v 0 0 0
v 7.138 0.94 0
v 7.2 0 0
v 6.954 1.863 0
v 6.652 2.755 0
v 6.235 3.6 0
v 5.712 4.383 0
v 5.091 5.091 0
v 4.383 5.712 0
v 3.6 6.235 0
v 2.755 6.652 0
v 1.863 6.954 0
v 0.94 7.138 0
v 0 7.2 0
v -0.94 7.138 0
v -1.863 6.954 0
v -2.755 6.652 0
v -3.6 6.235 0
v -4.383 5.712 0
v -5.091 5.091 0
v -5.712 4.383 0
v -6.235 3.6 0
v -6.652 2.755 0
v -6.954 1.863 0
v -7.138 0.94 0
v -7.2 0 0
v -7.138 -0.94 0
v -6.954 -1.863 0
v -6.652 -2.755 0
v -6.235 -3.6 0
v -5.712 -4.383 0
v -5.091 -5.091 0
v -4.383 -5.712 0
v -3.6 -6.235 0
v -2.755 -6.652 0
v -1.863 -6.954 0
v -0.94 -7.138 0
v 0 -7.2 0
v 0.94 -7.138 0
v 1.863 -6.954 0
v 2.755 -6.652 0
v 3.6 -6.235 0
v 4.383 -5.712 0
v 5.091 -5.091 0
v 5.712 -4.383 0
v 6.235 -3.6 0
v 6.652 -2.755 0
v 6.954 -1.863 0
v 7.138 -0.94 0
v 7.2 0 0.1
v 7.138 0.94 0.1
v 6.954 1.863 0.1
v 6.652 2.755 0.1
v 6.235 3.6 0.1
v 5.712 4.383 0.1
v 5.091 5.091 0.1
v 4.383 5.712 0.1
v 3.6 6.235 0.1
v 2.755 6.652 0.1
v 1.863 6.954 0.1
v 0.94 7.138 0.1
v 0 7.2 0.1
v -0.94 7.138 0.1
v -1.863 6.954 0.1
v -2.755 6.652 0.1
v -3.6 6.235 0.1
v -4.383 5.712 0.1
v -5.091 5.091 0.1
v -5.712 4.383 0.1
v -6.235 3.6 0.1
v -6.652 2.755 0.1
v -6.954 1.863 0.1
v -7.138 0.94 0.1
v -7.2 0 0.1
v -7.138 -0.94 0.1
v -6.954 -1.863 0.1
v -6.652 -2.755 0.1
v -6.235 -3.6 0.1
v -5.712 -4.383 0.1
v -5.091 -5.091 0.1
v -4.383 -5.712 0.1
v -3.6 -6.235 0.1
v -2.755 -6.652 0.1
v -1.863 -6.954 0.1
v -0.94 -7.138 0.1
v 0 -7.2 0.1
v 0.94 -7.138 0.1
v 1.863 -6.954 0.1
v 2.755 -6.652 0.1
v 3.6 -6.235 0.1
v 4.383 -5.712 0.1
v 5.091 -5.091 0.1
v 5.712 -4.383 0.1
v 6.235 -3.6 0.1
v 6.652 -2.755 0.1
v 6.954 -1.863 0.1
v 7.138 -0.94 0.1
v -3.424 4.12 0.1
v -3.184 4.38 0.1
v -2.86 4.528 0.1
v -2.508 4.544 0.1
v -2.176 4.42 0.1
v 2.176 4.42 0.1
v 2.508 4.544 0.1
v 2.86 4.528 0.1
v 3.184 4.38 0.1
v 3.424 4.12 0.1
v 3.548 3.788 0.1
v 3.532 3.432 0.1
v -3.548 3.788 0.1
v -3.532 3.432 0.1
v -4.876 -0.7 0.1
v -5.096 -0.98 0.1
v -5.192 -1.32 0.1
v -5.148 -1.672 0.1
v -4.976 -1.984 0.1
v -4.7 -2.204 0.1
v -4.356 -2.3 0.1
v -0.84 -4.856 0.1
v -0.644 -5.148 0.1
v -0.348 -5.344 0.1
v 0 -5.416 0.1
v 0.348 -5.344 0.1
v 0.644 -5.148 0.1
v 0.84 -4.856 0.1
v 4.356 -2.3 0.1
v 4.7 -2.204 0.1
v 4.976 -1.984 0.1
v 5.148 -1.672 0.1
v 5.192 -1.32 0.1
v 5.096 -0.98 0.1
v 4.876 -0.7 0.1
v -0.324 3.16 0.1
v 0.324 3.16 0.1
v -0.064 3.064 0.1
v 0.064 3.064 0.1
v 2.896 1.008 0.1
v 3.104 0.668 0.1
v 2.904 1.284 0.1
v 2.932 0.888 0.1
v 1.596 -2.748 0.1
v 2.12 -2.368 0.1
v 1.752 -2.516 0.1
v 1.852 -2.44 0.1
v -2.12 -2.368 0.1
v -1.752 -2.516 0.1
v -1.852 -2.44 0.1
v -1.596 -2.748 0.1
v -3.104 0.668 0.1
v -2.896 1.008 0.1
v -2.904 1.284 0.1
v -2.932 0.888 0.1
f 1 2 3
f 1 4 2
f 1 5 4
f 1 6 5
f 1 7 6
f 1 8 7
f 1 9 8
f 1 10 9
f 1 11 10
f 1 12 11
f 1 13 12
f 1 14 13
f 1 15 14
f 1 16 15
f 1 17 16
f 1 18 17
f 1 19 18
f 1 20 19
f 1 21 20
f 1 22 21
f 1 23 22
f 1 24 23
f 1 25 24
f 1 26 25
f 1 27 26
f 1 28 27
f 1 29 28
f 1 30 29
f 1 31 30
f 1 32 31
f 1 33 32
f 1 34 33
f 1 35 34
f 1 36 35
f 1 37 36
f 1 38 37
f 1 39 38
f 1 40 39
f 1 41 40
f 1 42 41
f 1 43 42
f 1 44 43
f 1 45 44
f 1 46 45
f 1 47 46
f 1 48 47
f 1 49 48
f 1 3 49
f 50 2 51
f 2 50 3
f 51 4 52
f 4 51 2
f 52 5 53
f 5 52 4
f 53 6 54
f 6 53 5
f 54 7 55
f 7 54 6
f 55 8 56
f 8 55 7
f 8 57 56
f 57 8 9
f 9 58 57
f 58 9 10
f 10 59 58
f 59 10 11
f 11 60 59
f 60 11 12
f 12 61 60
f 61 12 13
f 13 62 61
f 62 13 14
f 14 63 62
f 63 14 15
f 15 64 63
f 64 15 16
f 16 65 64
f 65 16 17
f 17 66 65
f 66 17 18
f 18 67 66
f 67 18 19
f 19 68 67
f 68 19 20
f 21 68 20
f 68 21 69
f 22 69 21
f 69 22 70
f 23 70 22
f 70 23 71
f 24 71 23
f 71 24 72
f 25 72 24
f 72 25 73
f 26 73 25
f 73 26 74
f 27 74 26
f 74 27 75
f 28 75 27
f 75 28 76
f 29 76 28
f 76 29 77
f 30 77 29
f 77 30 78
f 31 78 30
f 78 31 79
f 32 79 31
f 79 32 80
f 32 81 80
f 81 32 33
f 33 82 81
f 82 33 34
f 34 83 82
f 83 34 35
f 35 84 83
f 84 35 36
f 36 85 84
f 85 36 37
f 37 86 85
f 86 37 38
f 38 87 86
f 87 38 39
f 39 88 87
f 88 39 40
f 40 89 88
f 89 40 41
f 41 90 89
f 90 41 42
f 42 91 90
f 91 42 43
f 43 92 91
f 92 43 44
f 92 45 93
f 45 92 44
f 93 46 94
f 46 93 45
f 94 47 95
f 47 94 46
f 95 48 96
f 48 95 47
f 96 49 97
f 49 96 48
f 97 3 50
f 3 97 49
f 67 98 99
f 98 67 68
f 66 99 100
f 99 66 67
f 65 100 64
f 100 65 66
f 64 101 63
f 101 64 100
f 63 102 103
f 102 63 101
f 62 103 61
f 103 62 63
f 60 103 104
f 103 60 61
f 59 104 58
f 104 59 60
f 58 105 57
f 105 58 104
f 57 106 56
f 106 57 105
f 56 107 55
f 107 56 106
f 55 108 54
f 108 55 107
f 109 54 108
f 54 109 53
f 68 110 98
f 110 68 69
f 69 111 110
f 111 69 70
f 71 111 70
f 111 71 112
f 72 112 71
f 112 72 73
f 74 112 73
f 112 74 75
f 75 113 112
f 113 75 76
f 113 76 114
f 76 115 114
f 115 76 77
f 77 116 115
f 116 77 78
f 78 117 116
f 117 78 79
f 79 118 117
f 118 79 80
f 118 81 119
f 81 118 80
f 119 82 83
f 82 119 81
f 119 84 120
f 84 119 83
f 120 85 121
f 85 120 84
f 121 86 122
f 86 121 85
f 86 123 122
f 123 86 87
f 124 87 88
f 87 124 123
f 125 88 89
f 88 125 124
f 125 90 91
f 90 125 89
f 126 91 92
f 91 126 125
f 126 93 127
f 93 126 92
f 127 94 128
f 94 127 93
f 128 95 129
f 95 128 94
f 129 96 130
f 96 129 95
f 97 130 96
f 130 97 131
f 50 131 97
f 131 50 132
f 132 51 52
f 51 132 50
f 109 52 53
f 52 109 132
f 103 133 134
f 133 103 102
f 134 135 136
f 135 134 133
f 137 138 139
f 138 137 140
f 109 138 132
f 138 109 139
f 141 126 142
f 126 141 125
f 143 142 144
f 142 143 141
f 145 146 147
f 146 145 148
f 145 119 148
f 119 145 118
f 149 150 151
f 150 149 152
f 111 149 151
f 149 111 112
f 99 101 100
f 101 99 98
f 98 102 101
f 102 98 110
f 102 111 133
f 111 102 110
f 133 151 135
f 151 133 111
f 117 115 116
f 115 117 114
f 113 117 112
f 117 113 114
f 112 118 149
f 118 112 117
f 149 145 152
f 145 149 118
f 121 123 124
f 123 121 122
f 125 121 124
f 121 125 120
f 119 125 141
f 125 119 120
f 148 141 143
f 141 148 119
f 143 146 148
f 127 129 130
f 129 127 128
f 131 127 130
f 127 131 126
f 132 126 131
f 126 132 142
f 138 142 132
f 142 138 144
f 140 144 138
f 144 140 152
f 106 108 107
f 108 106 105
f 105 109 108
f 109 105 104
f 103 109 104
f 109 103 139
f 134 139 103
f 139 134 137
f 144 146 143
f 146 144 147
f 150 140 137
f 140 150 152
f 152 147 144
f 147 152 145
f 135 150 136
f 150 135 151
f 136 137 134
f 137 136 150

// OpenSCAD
// file: ../p/48/1-4cyli.scad
use <../../lib.scad>
function ldraw_lib__48__1_4cyli() = [
// 0 Hi-Res Cylinder 0.25
// 0 Name: 48\1-4cyli.dat
// 0 Author: Manfred Moolhuysen
// 0 !LDRAW_ORG 48_Primitive UPDATE 2009-01
// 0 !LICENSE Licensed under CC BY 2.0 and CC BY 4.0 : see CAreadme.txt
// 
// 0 BFC CERTIFY CCW
  [0,"BFC","CERTIFY"],
  [0,"BFC","CCW"],
// 
// 0 !HISTORY 1999-07-05 [PTadmin] Official Update 1999-05
// 0 !HISTORY 2002-02-28 [hafhead] Added BFC statement
// 0 !HISTORY 2002-04-25 [PTadmin] Official Update 2002-02
// 0 !HISTORY 2007-06-24 [PTadmin] Header formatted for Contributor Agreement
// 0 !HISTORY 2008-07-01 [PTadmin] Official Update 2008-01
// 0 !HISTORY 2008-07-07 [guyvivan] Made BFC'ed CCW (2005-12-06)
// 0 !HISTORY 2009-05-02 [PTadmin] Official Update 2009-01
// 
// 
// 4 16 0.9914 0 0.1305 1 0 0 1 1 0 0.9914 1 0.1305
  [4,16,0.9914,0,0.1305,1,0,0,1,1,0,0.9914,1,0.1305],
// 4 16 0.9659 0 0.2588 0.9914 0 0.1305 0.9914 1 0.1305 0.9659 1 0.2588
  [4,16,0.9659,0,0.2588,0.9914,0,0.1305,0.9914,1,0.1305,0.9659,1,0.2588],
// 4 16 0.9239 0 0.3827 0.9659 0 0.2588 0.9659 1 0.2588 0.9239 1 0.3827
  [4,16,0.9239,0,0.3827,0.9659,0,0.2588,0.9659,1,0.2588,0.9239,1,0.3827],
// 4 16 0.866 0 0.5 0.9239 0 0.3827 0.9239 1 0.3827 0.866 1 0.5
  [4,16,0.866,0,0.5,0.9239,0,0.3827,0.9239,1,0.3827,0.866,1,0.5],
// 4 16 0.7934 0 0.6088 0.866 0 0.5 0.866 1 0.5 0.7934 1 0.6088
  [4,16,0.7934,0,0.6088,0.866,0,0.5,0.866,1,0.5,0.7934,1,0.6088],
// 4 16 0.7071 0 0.7071 0.7934 0 0.6088 0.7934 1 0.6088 0.7071 1 0.7071
  [4,16,0.7071,0,0.7071,0.7934,0,0.6088,0.7934,1,0.6088,0.7071,1,0.7071],
// 4 16 0.6088 0 0.7934 0.7071 0 0.7071 0.7071 1 0.7071 0.6088 1 0.7934
  [4,16,0.6088,0,0.7934,0.7071,0,0.7071,0.7071,1,0.7071,0.6088,1,0.7934],
// 4 16 0.5 0 0.866 0.6088 0 0.7934 0.6088 1 0.7934 0.5 1 0.866
  [4,16,0.5,0,0.866,0.6088,0,0.7934,0.6088,1,0.7934,0.5,1,0.866],
// 4 16 0.3827 0 0.9239 0.5 0 0.866 0.5 1 0.866 0.3827 1 0.9239
  [4,16,0.3827,0,0.9239,0.5,0,0.866,0.5,1,0.866,0.3827,1,0.9239],
// 4 16 0.2588 0 0.9659 0.3827 0 0.9239 0.3827 1 0.9239 0.2588 1 0.9659
  [4,16,0.2588,0,0.9659,0.3827,0,0.9239,0.3827,1,0.9239,0.2588,1,0.9659],
// 4 16 0.1305 0 0.9914 0.2588 0 0.9659 0.2588 1 0.9659 0.1305 1 0.9914
  [4,16,0.1305,0,0.9914,0.2588,0,0.9659,0.2588,1,0.9659,0.1305,1,0.9914],
// 4 16 0 0 1 0.1305 0 0.9914 0.1305 1 0.9914 0 1 1
  [4,16,0,0,1,0.1305,0,0.9914,0.1305,1,0.9914,0,1,1],
// 
// 0 conditional lines
// 5 24 1 1 0 1 0 0 1 1 -1 0.9914 1 0.1305
  [5,24,1,1,0,1,0,0,1,1,-1,0.9914,1,0.1305],
// 5 24 0.9914 1 0.1305 0.9914 0 0.1305 1 1 0 0.9659 1 0.2588
  [5,24,0.9914,1,0.1305,0.9914,0,0.1305,1,1,0,0.9659,1,0.2588],
// 5 24 0.9659 1 0.2588 0.9659 0 0.2588 0.9914 1 0.1305 0.9239 1 0.3827
  [5,24,0.9659,1,0.2588,0.9659,0,0.2588,0.9914,1,0.1305,0.9239,1,0.3827],
// 5 24 0.9239 1 0.3827 0.9239 0 0.3827 0.9659 1 0.2588 0.866 1 0.5
  [5,24,0.9239,1,0.3827,0.9239,0,0.3827,0.9659,1,0.2588,0.866,1,0.5],
// 5 24 0.866 1 0.5 0.866 0 0.5 0.9239 1 0.3827 0.7934 1 0.6088
  [5,24,0.866,1,0.5,0.866,0,0.5,0.9239,1,0.3827,0.7934,1,0.6088],
// 5 24 0.7934 1 0.6088 0.7934 0 0.6088 0.866 1 0.5 0.7071 1 0.7071
  [5,24,0.7934,1,0.6088,0.7934,0,0.6088,0.866,1,0.5,0.7071,1,0.7071],
// 5 24 0.7071 1 0.7071 0.7071 0 0.7071 0.7934 1 0.6088 0.6088 1 0.7934
  [5,24,0.7071,1,0.7071,0.7071,0,0.7071,0.7934,1,0.6088,0.6088,1,0.7934],
// 5 24 0.6088 1 0.7934 0.6088 0 0.7934 0.7071 1 0.7071 0.5 1 0.866
  [5,24,0.6088,1,0.7934,0.6088,0,0.7934,0.7071,1,0.7071,0.5,1,0.866],
// 5 24 0.5 1 0.866 0.5 0 0.866 0.6088 1 0.7934 0.3827 1 0.9239
  [5,24,0.5,1,0.866,0.5,0,0.866,0.6088,1,0.7934,0.3827,1,0.9239],
// 5 24 0.3827 1 0.9239 0.3827 0 0.9239 0.5 1 0.866 0.2588 1 0.9659
  [5,24,0.3827,1,0.9239,0.3827,0,0.9239,0.5,1,0.866,0.2588,1,0.9659],
// 5 24 0.2588 1 0.9659 0.2588 0 0.9659 0.3827 1 0.9239 0.1305 1 0.9914
  [5,24,0.2588,1,0.9659,0.2588,0,0.9659,0.3827,1,0.9239,0.1305,1,0.9914],
// 5 24 0.1305 1 0.9914 0.1305 0 0.9914 0.2588 1 0.9659 0 1 1
  [5,24,0.1305,1,0.9914,0.1305,0,0.9914,0.2588,1,0.9659,0,1,1],
// 5 24 0 1 1 0 0 1 0.1305 1 0.9914 -1 1 1
  [5,24,0,1,1,0,0,1,0.1305,1,0.9914,-1,1,1],
// 
// 0 end of file
];
module ldraw_lib__48__1_4cyli(step=0, col=false, unit=2/5, alt=false, line=0.2, solid=!$preview)
    makepoly(ldraw_lib__48__1_4cyli(), step=step, col=col, unit=unit, alt=alt, line=line, solid=solid);
ldraw_lib__48__1_4cyli(line=0.2);
// file: ../p/48/4-4disc.scad
use <../../lib.scad>
function ldraw_lib__48__4_4disc() = [
// 0 Hi-Res Disc 1.0
// 0 Name: 48\4-4disc.dat
// 0 Author: Miklos Hosszu [hmick]
// 0 !LDRAW_ORG 48_Primitive UPDATE 2012-02
// 0 !LICENSE Licensed under CC BY 2.0 and CC BY 4.0 : see CAreadme.txt
// 
// 0 BFC CERTIFY CCW
  [0,"BFC","CERTIFY"],
  [0,"BFC","CCW"],
// 
// 0 !HISTORY 2004-11-06 [PTadmin] Official Update 2004-04
// 0 !HISTORY 2007-06-24 [PTadmin] Header formatted for Contributor Agreement
// 0 !HISTORY 2008-07-01 [PTadmin] Official Update 2008-01
// 0 !HISTORY 2012-02-27 [Philo] Changed to CCW
// 0 !HISTORY 2012-08-09 [PTadmin] Official Update 2012-02
// 
// 
// 3 16 1 0 0 0.9914 0 0.1305 0 0 0
  [3,16,1,0,0,0.9914,0,0.1305,0,0,0],
// 3 16 0.9914 0 0.1305 0.9659 0 0.2588 0 0 0
  [3,16,0.9914,0,0.1305,0.9659,0,0.2588,0,0,0],
// 3 16 0.9659 0 0.2588 0.9239 0 0.3827 0 0 0
  [3,16,0.9659,0,0.2588,0.9239,0,0.3827,0,0,0],
// 3 16 0.9239 0 0.3827 0.866 0 0.5 0 0 0
  [3,16,0.9239,0,0.3827,0.866,0,0.5,0,0,0],
// 3 16 0.866 0 0.5 0.7934 0 0.6088 0 0 0
  [3,16,0.866,0,0.5,0.7934,0,0.6088,0,0,0],
// 3 16 0.7934 0 0.6088 0.7071 0 0.7071 0 0 0
  [3,16,0.7934,0,0.6088,0.7071,0,0.7071,0,0,0],
// 3 16 0.7071 0 0.7071 0.6088 0 0.7934 0 0 0
  [3,16,0.7071,0,0.7071,0.6088,0,0.7934,0,0,0],
// 3 16 0.6088 0 0.7934 0.5 0 0.866 0 0 0
  [3,16,0.6088,0,0.7934,0.5,0,0.866,0,0,0],
// 3 16 0.5 0 0.866 0.3827 0 0.9239 0 0 0
  [3,16,0.5,0,0.866,0.3827,0,0.9239,0,0,0],
// 3 16 0.3827 0 0.9239 0.2588 0 0.9659 0 0 0
  [3,16,0.3827,0,0.9239,0.2588,0,0.9659,0,0,0],
// 3 16 0.2588 0 0.9659 0.1305 0 0.9914 0 0 0
  [3,16,0.2588,0,0.9659,0.1305,0,0.9914,0,0,0],
// 3 16 0.1305 0 0.9914 0 0 1 0 0 0
  [3,16,0.1305,0,0.9914,0,0,1,0,0,0],
// 3 16 0 0 1 -0.1305 0 0.9914 0 0 0
  [3,16,0,0,1,-0.1305,0,0.9914,0,0,0],
// 3 16 -0.1305 0 0.9914 -0.2588 0 0.9659 0 0 0
  [3,16,-0.1305,0,0.9914,-0.2588,0,0.9659,0,0,0],
// 3 16 -0.2588 0 0.9659 -0.3827 0 0.9239 0 0 0
  [3,16,-0.2588,0,0.9659,-0.3827,0,0.9239,0,0,0],
// 3 16 -0.3827 0 0.9239 -0.5 0 0.866 0 0 0
  [3,16,-0.3827,0,0.9239,-0.5,0,0.866,0,0,0],
// 3 16 -0.5 0 0.866 -0.6088 0 0.7934 0 0 0
  [3,16,-0.5,0,0.866,-0.6088,0,0.7934,0,0,0],
// 3 16 -0.6088 0 0.7934 -0.7071 0 0.7071 0 0 0
  [3,16,-0.6088,0,0.7934,-0.7071,0,0.7071,0,0,0],
// 3 16 -0.7071 0 0.7071 -0.7934 0 0.6088 0 0 0
  [3,16,-0.7071,0,0.7071,-0.7934,0,0.6088,0,0,0],
// 3 16 -0.7934 0 0.6088 -0.866 0 0.5 0 0 0
  [3,16,-0.7934,0,0.6088,-0.866,0,0.5,0,0,0],
// 3 16 -0.866 0 0.5 -0.9239 0 0.3827 0 0 0
  [3,16,-0.866,0,0.5,-0.9239,0,0.3827,0,0,0],
// 3 16 -0.9239 0 0.3827 -0.9659 0 0.2588 0 0 0
  [3,16,-0.9239,0,0.3827,-0.9659,0,0.2588,0,0,0],
// 3 16 -0.9659 0 0.2588 -0.9914 0 0.1305 0 0 0
  [3,16,-0.9659,0,0.2588,-0.9914,0,0.1305,0,0,0],
// 3 16 -0.9914 0 0.1305 -1 0 0 0 0 0
  [3,16,-0.9914,0,0.1305,-1,0,0,0,0,0],
// 3 16 -1 0 0 -0.9914 0 -0.1305 0 0 0
  [3,16,-1,0,0,-0.9914,0,-0.1305,0,0,0],
// 3 16 -0.9914 0 -0.1305 -0.9659 0 -0.2588 0 0 0
  [3,16,-0.9914,0,-0.1305,-0.9659,0,-0.2588,0,0,0],
// 3 16 -0.9659 0 -0.2588 -0.9239 0 -0.3827 0 0 0
  [3,16,-0.9659,0,-0.2588,-0.9239,0,-0.3827,0,0,0],
// 3 16 -0.9239 0 -0.3827 -0.866 0 -0.5 0 0 0
  [3,16,-0.9239,0,-0.3827,-0.866,0,-0.5,0,0,0],
// 3 16 -0.866 0 -0.5 -0.7934 0 -0.6088 0 0 0
  [3,16,-0.866,0,-0.5,-0.7934,0,-0.6088,0,0,0],
// 3 16 -0.7934 0 -0.6088 -0.7071 0 -0.7071 0 0 0
  [3,16,-0.7934,0,-0.6088,-0.7071,0,-0.7071,0,0,0],
// 3 16 -0.7071 0 -0.7071 -0.6088 0 -0.7934 0 0 0
  [3,16,-0.7071,0,-0.7071,-0.6088,0,-0.7934,0,0,0],
// 3 16 -0.6088 0 -0.7934 -0.5 0 -0.866 0 0 0
  [3,16,-0.6088,0,-0.7934,-0.5,0,-0.866,0,0,0],
// 3 16 -0.5 0 -0.866 -0.3827 0 -0.9239 0 0 0
  [3,16,-0.5,0,-0.866,-0.3827,0,-0.9239,0,0,0],
// 3 16 -0.3827 0 -0.9239 -0.2588 0 -0.9659 0 0 0
  [3,16,-0.3827,0,-0.9239,-0.2588,0,-0.9659,0,0,0],
// 3 16 -0.2588 0 -0.9659 -0.1305 0 -0.9914 0 0 0
  [3,16,-0.2588,0,-0.9659,-0.1305,0,-0.9914,0,0,0],
// 3 16 -0.1305 0 -0.9914 0 0 -1 0 0 0
  [3,16,-0.1305,0,-0.9914,0,0,-1,0,0,0],
// 3 16 0 0 -1 0.1305 0 -0.9914 0 0 0
  [3,16,0,0,-1,0.1305,0,-0.9914,0,0,0],
// 3 16 0.1305 0 -0.9914 0.2588 0 -0.9659 0 0 0
  [3,16,0.1305,0,-0.9914,0.2588,0,-0.9659,0,0,0],
// 3 16 0.2588 0 -0.9659 0.3827 0 -0.9239 0 0 0
  [3,16,0.2588,0,-0.9659,0.3827,0,-0.9239,0,0,0],
// 3 16 0.3827 0 -0.9239 0.5 0 -0.866 0 0 0
  [3,16,0.3827,0,-0.9239,0.5,0,-0.866,0,0,0],
// 3 16 0.5 0 -0.866 0.6088 0 -0.7934 0 0 0
  [3,16,0.5,0,-0.866,0.6088,0,-0.7934,0,0,0],
// 3 16 0.6088 0 -0.7934 0.7071 0 -0.7071 0 0 0
  [3,16,0.6088,0,-0.7934,0.7071,0,-0.7071,0,0,0],
// 3 16 0.7071 0 -0.7071 0.7934 0 -0.6088 0 0 0
  [3,16,0.7071,0,-0.7071,0.7934,0,-0.6088,0,0,0],
// 3 16 0.7934 0 -0.6088 0.866 0 -0.5 0 0 0
  [3,16,0.7934,0,-0.6088,0.866,0,-0.5,0,0,0],
// 3 16 0.866 0 -0.5 0.9239 0 -0.3827 0 0 0
  [3,16,0.866,0,-0.5,0.9239,0,-0.3827,0,0,0],
// 3 16 0.9239 0 -0.3827 0.9659 0 -0.2588 0 0 0
  [3,16,0.9239,0,-0.3827,0.9659,0,-0.2588,0,0,0],
// 3 16 0.9659 0 -0.2588 0.9914 0 -0.1305 0 0 0
  [3,16,0.9659,0,-0.2588,0.9914,0,-0.1305,0,0,0],
// 3 16 0.9914 0 -0.1305 1 0 0 0 0 0
  [3,16,0.9914,0,-0.1305,1,0,0,0,0,0],
];
module ldraw_lib__48__4_4disc(step=0, col=false, unit=2/5, alt=false, line=0.2, solid=!$preview)
    makepoly(ldraw_lib__48__4_4disc(), step=step, col=col, unit=unit, alt=alt, line=line, solid=solid);
ldraw_lib__48__4_4disc(line=0.2);
// file: ../p/48/4-4cyli.scad
use <../../lib.scad>
use <1-4cyli.scad>
function ldraw_lib__48__4_4cyli() = [
// 0 Hi-Res Cylinder 1.0
// 0 Name: 48\4-4cyli.dat
// 0 Author: Paul Easter [pneaster]
// 0 !LDRAW_ORG 48_Primitive UPDATE 2012-02
// 0 !LICENSE Licensed under CC BY 4.0 : see CAreadme.txt
// 
// 0 BFC CERTIFY CCW
  [0,"BFC","CERTIFY"],
  [0,"BFC","CCW"],
// 
// 0 !HISTORY 2002-08-18 [PTadmin] Official Update 2002-04
// 0 !HISTORY 2007-06-24 [PTadmin] Header formatted for Contributor Agreement
// 0 !HISTORY 2008-07-01 [PTadmin] Official Update 2008-01
// 0 !HISTORY 2012-02-27 [Philo] Changed to CCW
// 0 !HISTORY 2012-08-09 [PTadmin] Official Update 2012-02
// 
// 
// 1 16 0 0 0 1 0 0 0 1 0 0 0 1 48\1-4cyli.dat
  [1,16,0,0,0,1,0,0,0,1,0,0,0,1, ldraw_lib__48__1_4cyli()],
// 1 16 0 0 0 0 0 -1 0 1 0 1 0 0 48\1-4cyli.dat
  [1,16,0,0,0,0,0,-1,0,1,0,1,0,0, ldraw_lib__48__1_4cyli()],
// 1 16 0 0 0 -1 0 0 0 1 0 0 0 -1 48\1-4cyli.dat
  [1,16,0,0,0,-1,0,0,0,1,0,0,0,-1, ldraw_lib__48__1_4cyli()],
// 1 16 0 0 0 0 0 1 0 1 0 -1 0 0 48\1-4cyli.dat
  [1,16,0,0,0,0,0,1,0,1,0,-1,0,0, ldraw_lib__48__1_4cyli()],
];
module ldraw_lib__48__4_4cyli(step=0, col=false, unit=2/5, alt=false, line=0.2, solid=!$preview)
    makepoly(ldraw_lib__48__4_4cyli(), step=step, col=col, unit=unit, alt=alt, line=line, solid=solid);
ldraw_lib__48__4_4cyli(line=0.2);
// file: ../p/48/4-4cylc3.scad
use <../../lib.scad>
use <4-4cyli.scad>
use <4-4disc.scad>
function ldraw_lib__48__4_4cylc3() = [
// 0 Hi-Res Cylinder Closed 1.0 without Top or Bottom Edge Lines
// 0 Name: 48\4-4cylc3.dat
// 0 Author: Chris Dee [cwdee]
// 0 !LDRAW_ORG 48_Primitive UPDATE 2017-01
// 0 !LICENSE Licensed under CC BY 4.0 : see CAreadme.txt
// 
// 0 BFC CERTIFY CCW
  [0,"BFC","CERTIFY"],
  [0,"BFC","CCW"],
// 
// 0 !HISTORY 2017-12-30 [PTadmin] Official Update 2017-01
// 
// 
// 1 16 0 0 0 1 0 0 0 1 0 0 0 1 48\4-4disc.dat
  [1,16,0,0,0,1,0,0,0,1,0,0,0,1, ldraw_lib__48__4_4disc()],
// 1 16 0 0 0 1 0 0 0 1 0 0 0 1 48\4-4cyli.dat
  [1,16,0,0,0,1,0,0,0,1,0,0,0,1, ldraw_lib__48__4_4cyli()],
// 0
];
module ldraw_lib__48__4_4cylc3(step=0, col=false, unit=2/5, alt=false, line=0.2, solid=!$preview)
    makepoly(ldraw_lib__48__4_4cylc3(), step=step, col=col, unit=unit, alt=alt, line=line, solid=solid);
ldraw_lib__48__4_4cylc3(line=0.2);
// main file
use <../lib.scad>
use <../p/48/4-4cylc3.scad>
function ldraw_lib__6259759f() = [
// 0 Sticker  1.8 x  1.8 Round with Magenta Star
// 0 Name: 6259759f.dat
// 0 Author: Evert-Jan Boer [ejboer]
// 0 !LDRAW_ORG Part UPDATE 2022-05
// 0 !LICENSE Licensed under CC BY 4.0 : see CAreadme.txt
// 
// 0 BFC CERTIFY CCW
  [0,"BFC","CERTIFY"],
  [0,"BFC","CCW"],
// 
// 0 !KEYWORDS Pop-Up Party Bus, Set 70828
// 
// 0 !HISTORY 2022-09-15 [PTadmin] Official Update 2022-05
// 
// 
// 1 16 0 0 0 18 0 0 0 -0.25 0 0 0 18 48\4-4cylc3.dat
  [1,16,0,0,0,18,0,0,0,-0.25,0,0,0,18, ldraw_lib__48__4_4cylc3()],
// 
// 4 353 -8.56 -.25 10.3 -7.96 -.25 10.95 -10.9584 -.25 14.2812 -12.7278 -.25 12.7278
  [4,353,-8.56,-.25,10.3,-7.96,-.25,10.95,-10.9584,-.25,14.2812,-12.7278,-.25,12.7278],
// 4 353 -7.15 -.25 11.32 -9 -.25 15.588 -10.9584 -.25 14.2812 -7.96 -.25 10.95
  [4,353,-7.15,-.25,11.32,-9,-.25,15.588,-10.9584,-.25,14.2812,-7.96,-.25,10.95],
// 4 353 -9 -.25 15.588 -7.15 -.25 11.32 -4.6584 -.25 17.3862 -6.8886 -.25 16.6302
  [4,353,-9,-.25,15.588,-7.15,-.25,11.32,-4.6584,-.25,17.3862,-6.8886,-.25,16.6302],
// 4 353 -7.15 -.25 11.32 -6.27 -.25 11.36 -2.349 -.25 17.8452 -4.6584 -.25 17.3862
  [4,353,-7.15,-.25,11.32,-6.27,-.25,11.36,-2.349,-.25,17.8452,-4.6584,-.25,17.3862],
// 4 353 -6.27 -.25 11.36 -5.44 -.25 11.05 5.44 -.25 11.05 -2.349 -.25 17.8452
  [4,353,-6.27,-.25,11.36,-5.44,-.25,11.05,5.44,-.25,11.05,-2.349,-.25,17.8452],
// 4 353 2.349 -.25 17.8452 0 -.25 18 -2.349 -.25 17.8452 5.44 -.25 11.05
  [4,353,2.349,-.25,17.8452,0,-.25,18,-2.349,-.25,17.8452,5.44,-.25,11.05],
// 4 353 2.349 -.25 17.8452 5.44 -.25 11.05 6.27 -.25 11.36 4.6584 -.25 17.3862
  [4,353,2.349,-.25,17.8452,5.44,-.25,11.05,6.27,-.25,11.36,4.6584,-.25,17.3862],
// 4 353 4.6584 -.25 17.3862 6.27 -.25 11.36 9 -.25 15.588 6.8886 -.25 16.6302
  [4,353,4.6584,-.25,17.3862,6.27,-.25,11.36,9,-.25,15.588,6.8886,-.25,16.6302],
// 4 353 6.27 -.25 11.36 7.15 -.25 11.32 10.9584 -.25 14.2812 9 -.25 15.588
  [4,353,6.27,-.25,11.36,7.15,-.25,11.32,10.9584,-.25,14.2812,9,-.25,15.588],
// 4 353 12.7278 -.25 12.7278 10.9584 -.25 14.2812 7.15 -.25 11.32 7.96 -.25 10.95
  [4,353,12.7278,-.25,12.7278,10.9584,-.25,14.2812,7.15,-.25,11.32,7.96,-.25,10.95],
// 4 353 7.96 -.25 10.95 8.56 -.25 10.3 14.2812 -.25 10.9584 12.7278 -.25 12.7278
  [4,353,7.96,-.25,10.95,8.56,-.25,10.3,14.2812,-.25,10.9584,12.7278,-.25,12.7278],
// 4 353 8.56 -.25 10.3 8.87 -.25 9.47 15.588 -.25 9 14.2812 -.25 10.9584
  [4,353,8.56,-.25,10.3,8.87,-.25,9.47,15.588,-.25,9,14.2812,-.25,10.9584],
// 4 353 8.87 -.25 9.47 8.83 -.25 8.58 16.6302 -.25 6.8886 15.588 -.25 9
  [4,353,8.87,-.25,9.47,8.83,-.25,8.58,16.6302,-.25,6.8886,15.588,-.25,9],
// 4 353 -8.87 -.25 9.47 -8.56 -.25 10.3 -12.7278 -.25 12.7278 -14.2812 -.25 10.9584
  [4,353,-8.87,-.25,9.47,-8.56,-.25,10.3,-12.7278,-.25,12.7278,-14.2812,-.25,10.9584],
// 4 353 -14.2812 -.25 10.9584 -15.588 -.25 9 -8.83 -.25 8.58 -8.87 -.25 9.47
  [4,353,-14.2812,-.25,10.9584,-15.588,-.25,9,-8.83,-.25,8.58,-8.87,-.25,9.47],
// 4 353 -16.6302 -.25 6.8886 -12.19 -.25 -1.75 -8.83 -.25 8.58 -15.588 -.25 9
  [4,353,-16.6302,-.25,6.8886,-12.19,-.25,-1.75,-8.83,-.25,8.58,-15.588,-.25,9],
// 4 353 -16.6302 -.25 6.8886 -17.3862 -.25 4.6584 -17.8452 -.25 2.349 -12.19 -.25 -1.75
  [4,353,-16.6302,-.25,6.8886,-17.3862,-.25,4.6584,-17.8452,-.25,2.349,-12.19,-.25,-1.75],
// 4 353 -17.845201171875 -.25 -2.349 -12.19 -.25 -1.75 -17.8452 -.25 2.349 -18 -.25 0
  [4,353,-17.845201171875,-.25,-2.349,-12.19,-.25,-1.75,-17.8452,-.25,2.349,-18,-.25,0],
// 4 353 -12.19 -.25 -1.75 -17.845201171875 -.25 -2.349 -17.3862 -.25 -4.6584 -12.74 -.25 -2.45
  [4,353,-12.19,-.25,-1.75,-17.845201171875,-.25,-2.349,-17.3862,-.25,-4.6584,-12.74,-.25,-2.45],
// 3 353 -12.74 -.25 -2.45 -17.3862 -.25 -4.6584 -12.98 -.25 -3.3
  [3,353,-12.74,-.25,-2.45,-17.3862,-.25,-4.6584,-12.98,-.25,-3.3],
// 4 353 -12.98 -.25 -3.3 -17.3862 -.25 -4.6584 -16.6302 -.25 -6.8886 -12.87 -.25 -4.18
  [4,353,-12.98,-.25,-3.3,-17.3862,-.25,-4.6584,-16.6302,-.25,-6.8886,-12.87,-.25,-4.18],
// 4 353 -12.87 -.25 -4.18 -16.6302 -.25 -6.8886 -15.588 -.25 -9 -12.44 -.25 -4.96
  [4,353,-12.87,-.25,-4.18,-16.6302,-.25,-6.8886,-15.588,-.25,-9,-12.44,-.25,-4.96],
// 4 353 -14.2812 -.25 -10.9584 -11.75 -.25 -5.51 -12.44 -.25 -4.96 -15.588 -.25 -9
  [4,353,-14.2812,-.25,-10.9584,-11.75,-.25,-5.51,-12.44,-.25,-4.96,-15.588,-.25,-9],
// 4 353 -11.75 -.25 -5.51 -14.2812 -.25 -10.9584 -12.7278 -.25 -12.7278 -10.89 -.25 -5.75
  [4,353,-11.75,-.25,-5.51,-14.2812,-.25,-10.9584,-12.7278,-.25,-12.7278,-10.89,-.25,-5.75],
// 4 353 -10.9584 -.25 -14.2812 -2.1 -.25 -12.14 -10.89 -.25 -5.75 -12.7278 -.25 -12.7278
  [4,353,-10.9584,-.25,-14.2812,-2.1,-.25,-12.14,-10.89,-.25,-5.75,-12.7278,-.25,-12.7278],
// 4 353 -10.9584 -.25 -14.2812 -9 -.25 -15.588 -6.8886 -.25 -16.6302 -2.1 -.25 -12.14
  [4,353,-10.9584,-.25,-14.2812,-9,-.25,-15.588,-6.8886,-.25,-16.6302,-2.1,-.25,-12.14],
// 4 353 -6.8886 -.25 -16.6302 -4.6584 -.25 -17.3862 -1.61 -.25 -12.87 -2.1 -.25 -12.14
  [4,353,-6.8886,-.25,-16.6302,-4.6584,-.25,-17.3862,-1.61,-.25,-12.87,-2.1,-.25,-12.14],
// 4 353 -4.6584 -.25 -17.3862 -2.349 -.25 -17.8452 -.87 -.25 -13.36 -1.61 -.25 -12.87
  [4,353,-4.6584,-.25,-17.3862,-2.349,-.25,-17.8452,-.87,-.25,-13.36,-1.61,-.25,-12.87],
// 4 353 -2.349 -.25 -17.8452 0 -.25 -18 0 -.25 -13.54 -.87 -.25 -13.36
  [4,353,-2.349,-.25,-17.8452,0,-.25,-18,0,-.25,-13.54,-.87,-.25,-13.36],
// 4 353 0 -.25 -18 2.349 -.25 -17.8452 .87 -.25 -13.36 0 -.25 -13.54
  [4,353,0,-.25,-18,2.349,-.25,-17.8452,.87,-.25,-13.36,0,-.25,-13.54],
// 4 353 2.349 -.25 -17.8452 4.6584 -.25 -17.3862 1.61 -.25 -12.87 .87 -.25 -13.36
  [4,353,2.349,-.25,-17.8452,4.6584,-.25,-17.3862,1.61,-.25,-12.87,.87,-.25,-13.36],
// 4 353 4.6584 -.25 -17.3862 6.8886 -.25 -16.6302 2.1 -.25 -12.14 1.61 -.25 -12.87
  [4,353,4.6584,-.25,-17.3862,6.8886,-.25,-16.6302,2.1,-.25,-12.14,1.61,-.25,-12.87],
// 4 353 6.8886 -.25 -16.6302 9 -.25 -15.588 10.9584 -.25 -14.2812 2.1 -.25 -12.14
  [4,353,6.8886,-.25,-16.6302,9,-.25,-15.588,10.9584,-.25,-14.2812,2.1,-.25,-12.14],
// 4 353 2.1 -.25 -12.14 10.9584 -.25 -14.2812 12.7278 -.25 -12.7278 10.89 -.25 -5.75
  [4,353,2.1,-.25,-12.14,10.9584,-.25,-14.2812,12.7278,-.25,-12.7278,10.89,-.25,-5.75],
// 4 353 10.89 -.25 -5.75 12.7278 -.25 -12.7278 14.2812 -.25 -10.9584 11.75 -.25 -5.51
  [4,353,10.89,-.25,-5.75,12.7278,-.25,-12.7278,14.2812,-.25,-10.9584,11.75,-.25,-5.51],
// 4 353 11.75 -.25 -5.51 14.2812 -.25 -10.9584 15.588 -.25 -9 12.44 -.25 -4.96
  [4,353,11.75,-.25,-5.51,14.2812,-.25,-10.9584,15.588,-.25,-9,12.44,-.25,-4.96],
// 4 353 15.588 -.25 -9 16.6302 -.25 -6.8886 12.87 -.25 -4.18 12.44 -.25 -4.96
  [4,353,15.588,-.25,-9,16.6302,-.25,-6.8886,12.87,-.25,-4.18,12.44,-.25,-4.96],
// 4 353 16.6302 -.25 -6.8886 17.3862 -.25 -4.6584 12.98 -.25 -3.3 12.87 -.25 -4.18
  [4,353,16.6302,-.25,-6.8886,17.3862,-.25,-4.6584,12.98,-.25,-3.3,12.87,-.25,-4.18],
// 4 353 17.3862 -.25 -4.6584 17.8452 -.25 -2.349 12.74 -.25 -2.45 12.98 -.25 -3.3
  [4,353,17.3862,-.25,-4.6584,17.8452,-.25,-2.349,12.74,-.25,-2.45,12.98,-.25,-3.3],
// 4 353 17.8452 -.25 -2.349 18 -.25 0 12.19 -.25 -1.75 12.74 -.25 -2.45
  [4,353,17.8452,-.25,-2.349,18,-.25,0,12.19,-.25,-1.75,12.74,-.25,-2.45],
// 4 353 18 -.25 0 17.8452 -.25 2.349 17.3862 -.25 4.6584 12.19 -.25 -1.75
  [4,353,18,-.25,0,17.8452,-.25,2.349,17.3862,-.25,4.6584,12.19,-.25,-1.75],
// 4 353 8.83 -.25 8.58 12.19 -.25 -1.75 17.3862 -.25 4.6584 16.6302 -.25 6.8886
  [4,353,8.83,-.25,8.58,12.19,-.25,-1.75,17.3862,-.25,4.6584,16.6302,-.25,6.8886],
// 4 353 -.81 -.25 7.9 .81 -.25 7.9 5.44 -.25 11.05 -5.44 -.25 11.05
  [4,353,-.81,-.25,7.9,.81,-.25,7.9,5.44,-.25,11.05,-5.44,-.25,11.05],
// 4 353 -.16 -.25 7.66 .16 -.25 7.66 .81 -.25 7.9 -.81 -.25 7.9
  [4,353,-.16,-.25,7.66,.16,-.25,7.66,.81,-.25,7.9,-.81,-.25,7.9],
// 4 353 7.24 -.25 2.52 7.33 -.25 2.22 7.76 -.25 1.67 7.26 -.25 3.21
  [4,353,7.24,-.25,2.52,7.33,-.25,2.22,7.76,-.25,1.67,7.26,-.25,3.21],
// 4 353 7.76 -.25 1.67 12.19 -.25 -1.75 8.83 -.25 8.58 7.26 -.25 3.21
  [4,353,7.76,-.25,1.67,12.19,-.25,-1.75,8.83,-.25,8.58,7.26,-.25,3.21],
// 4 353 3.99 -.25 -6.87 2.1 -.25 -12.14 10.89 -.25 -5.75 5.3 -.25 -5.92
  [4,353,3.99,-.25,-6.87,2.1,-.25,-12.14,10.89,-.25,-5.75,5.3,-.25,-5.92],
// 4 353 3.99 -.25 -6.87 5.3 -.25 -5.92 4.63 -.25 -6.1 4.38 -.25 -6.29
  [4,353,3.99,-.25,-6.87,5.3,-.25,-5.92,4.63,-.25,-6.1,4.38,-.25,-6.29],
// 4 353 -4.63 -.25 -6.1 -5.3 -.25 -5.92 -3.99 -.25 -6.87 -4.38 -.25 -6.29
  [4,353,-4.63,-.25,-6.1,-5.3,-.25,-5.92,-3.99,-.25,-6.87,-4.38,-.25,-6.29],
// 4 353 -10.89 -.25 -5.75 -2.1 -.25 -12.14 -3.99 -.25 -6.87 -5.3 -.25 -5.92
  [4,353,-10.89,-.25,-5.75,-2.1,-.25,-12.14,-3.99,-.25,-6.87,-5.3,-.25,-5.92],
// 4 353 -7.24 -.25 2.52 -7.26 -.25 3.21 -7.76 -.25 1.67 -7.33 -.25 2.22
  [4,353,-7.24,-.25,2.52,-7.26,-.25,3.21,-7.76,-.25,1.67,-7.33,-.25,2.22],
// 4 353 -8.83 -.25 8.58 -12.19 -.25 -1.75 -7.76 -.25 1.67 -7.26 -.25 3.21
  [4,353,-8.83,-.25,8.58,-12.19,-.25,-1.75,-7.76,-.25,1.67,-7.26,-.25,3.21],
// 4 26 -7.96 -.25 10.95 -8.56 -.25 10.3 -6.27 -.25 11.36 -7.15 -.25 11.32
  [4,26,-7.96,-.25,10.95,-8.56,-.25,10.3,-6.27,-.25,11.36,-7.15,-.25,11.32],
// 4 26 -8.56 -.25 10.3 -8.87 -.25 9.47 -5.44 -.25 11.05 -6.27 -.25 11.36
  [4,26,-8.56,-.25,10.3,-8.87,-.25,9.47,-5.44,-.25,11.05,-6.27,-.25,11.36],
// 4 26 -8.87 -.25 9.47 -8.83 -.25 8.58 -.81 -.25 7.9 -5.44 -.25 11.05
  [4,26,-8.87,-.25,9.47,-8.83,-.25,8.58,-.81,-.25,7.9,-5.44,-.25,11.05],
// 4 26 -8.83 -.25 8.58 -7.26 -.25 3.21 -.16 -.25 7.66 -.81 -.25 7.9
  [4,26,-8.83,-.25,8.58,-7.26,-.25,3.21,-.16,-.25,7.66,-.81,-.25,7.9],
// 4 26 -12.87 -.25 -4.18 -12.44 -.25 -4.96 -11.75 -.25 -5.51 -12.98 -.25 -3.3
  [4,26,-12.87,-.25,-4.18,-12.44,-.25,-4.96,-11.75,-.25,-5.51,-12.98,-.25,-3.3],
// 4 26 -12.98 -.25 -3.3 -11.75 -.25 -5.51 -12.19 -.25 -1.75 -12.74 -.25 -2.45
  [4,26,-12.98,-.25,-3.3,-11.75,-.25,-5.51,-12.19,-.25,-1.75,-12.74,-.25,-2.45],
// 4 26 -11.75 -.25 -5.51 -10.89 -.25 -5.75 -7.76 -.25 1.67 -12.19 -.25 -1.75
  [4,26,-11.75,-.25,-5.51,-10.89,-.25,-5.75,-7.76,-.25,1.67,-12.19,-.25,-1.75],
// 4 26 -10.89 -.25 -5.75 -5.3 -.25 -5.92 -7.33 -.25 2.22 -7.76 -.25 1.67
  [4,26,-10.89,-.25,-5.75,-5.3,-.25,-5.92,-7.33,-.25,2.22,-7.76,-.25,1.67],
// 4 26 1.61 -.25 -12.87 -.87 -.25 -13.36 0 -.25 -13.54 .87 -.25 -13.36
  [4,26,1.61,-.25,-12.87,-.87,-.25,-13.36,0,-.25,-13.54,.87,-.25,-13.36],
// 4 26 -.87 -.25 -13.36 1.61 -.25 -12.87 2.1 -.25 -12.14 -1.61 -.25 -12.87
  [4,26,-.87,-.25,-13.36,1.61,-.25,-12.87,2.1,-.25,-12.14,-1.61,-.25,-12.87],
// 4 26 3.99 -.25 -6.87 -2.1 -.25 -12.14 -1.61 -.25 -12.87 2.1 -.25 -12.14
  [4,26,3.99,-.25,-6.87,-2.1,-.25,-12.14,-1.61,-.25,-12.87,2.1,-.25,-12.14],
// 4 26 -2.1 -.25 -12.14 3.99 -.25 -6.87 4.38 -.25 -6.29 -3.99 -.25 -6.87
  [4,26,-2.1,-.25,-12.14,3.99,-.25,-6.87,4.38,-.25,-6.29,-3.99,-.25,-6.87],
// 3 26 4.38 -.25 -6.29 -4.38 -.25 -6.29 -3.99 -.25 -6.87
  [3,26,4.38,-.25,-6.29,-4.38,-.25,-6.29,-3.99,-.25,-6.87],
// 4 26 11.75 -.25 -5.51 12.44 -.25 -4.96 12.87 -.25 -4.18 12.98 -.25 -3.3
  [4,26,11.75,-.25,-5.51,12.44,-.25,-4.96,12.87,-.25,-4.18,12.98,-.25,-3.3],
// 4 26 12.98 -.25 -3.3 12.74 -.25 -2.45 10.89 -.25 -5.75 11.75 -.25 -5.51
  [4,26,12.98,-.25,-3.3,12.74,-.25,-2.45,10.89,-.25,-5.75,11.75,-.25,-5.51],
// 4 26 12.74 -.25 -2.45 12.19 -.25 -1.75 5.3 -.25 -5.92 10.89 -.25 -5.75
  [4,26,12.74,-.25,-2.45,12.19,-.25,-1.75,5.3,-.25,-5.92,10.89,-.25,-5.75],
// 4 26 12.19 -.25 -1.75 7.76 -.25 1.67 4.63 -.25 -6.1 5.3 -.25 -5.92
  [4,26,12.19,-.25,-1.75,7.76,-.25,1.67,4.63,-.25,-6.1,5.3,-.25,-5.92],
// 4 26 -7.33 -.25 2.22 4.63 -.25 -6.1 7.76 -.25 1.67 7.33 -.25 2.22
  [4,26,-7.33,-.25,2.22,4.63,-.25,-6.1,7.76,-.25,1.67,7.33,-.25,2.22],
// 4 26 7.96 -.25 10.95 7.15 -.25 11.32 8.87 -.25 9.47 8.56 -.25 10.3
  [4,26,7.96,-.25,10.95,7.15,-.25,11.32,8.87,-.25,9.47,8.56,-.25,10.3],
// 4 26 7.15 -.25 11.32 6.27 -.25 11.36 8.83 -.25 8.58 8.87 -.25 9.47
  [4,26,7.15,-.25,11.32,6.27,-.25,11.36,8.83,-.25,8.58,8.87,-.25,9.47],
// 4 26 7.26 -.25 3.21 8.83 -.25 8.58 6.27 -.25 11.36 5.44 -.25 11.05
  [4,26,7.26,-.25,3.21,8.83,-.25,8.58,6.27,-.25,11.36,5.44,-.25,11.05],
// 4 26 5.44 -.25 11.05 .81 -.25 7.9 7.24 -.25 2.52 7.26 -.25 3.21
  [4,26,5.44,-.25,11.05,.81,-.25,7.9,7.24,-.25,2.52,7.26,-.25,3.21],
// 4 26 -4.38 -.25 -6.29 4.38 -.25 -6.29 4.63 -.25 -6.1 -4.63 -.25 -6.1
  [4,26,-4.38,-.25,-6.29,4.38,-.25,-6.29,4.63,-.25,-6.1,-4.63,-.25,-6.1],
// 4 26 -7.33 -.25 2.22 7.33 -.25 2.22 7.24 -.25 2.52 -7.24 -.25 2.52
  [4,26,-7.33,-.25,2.22,7.33,-.25,2.22,7.24,-.25,2.52,-7.24,-.25,2.52],
// 4 26 -5.3 -.25 -5.92 -4.63 -.25 -6.1 4.63 -.25 -6.1 -7.33 -.25 2.22
  [4,26,-5.3,-.25,-5.92,-4.63,-.25,-6.1,4.63,-.25,-6.1,-7.33,-.25,2.22],
// 4 26 -7.26 -.25 3.21 -7.24 -.25 2.52 .16 -.25 7.66 -.16 -.25 7.66
  [4,26,-7.26,-.25,3.21,-7.24,-.25,2.52,.16,-.25,7.66,-.16,-.25,7.66],
// 4 26 .81 -.25 7.9 .16 -.25 7.66 -7.24 -.25 2.52 7.24 -.25 2.52
  [4,26,.81,-.25,7.9,.16,-.25,7.66,-7.24,-.25,2.52,7.24,-.25,2.52],
];
module ldraw_lib__6259759f(step=0, col=false, unit=2/5, alt=false, line=0.2, solid=!$preview)
    makepoly(ldraw_lib__6259759f(), step=step, col=col, unit=unit, alt=alt, line=line, solid=solid);
ldraw_lib__6259759f(line=0.2);
